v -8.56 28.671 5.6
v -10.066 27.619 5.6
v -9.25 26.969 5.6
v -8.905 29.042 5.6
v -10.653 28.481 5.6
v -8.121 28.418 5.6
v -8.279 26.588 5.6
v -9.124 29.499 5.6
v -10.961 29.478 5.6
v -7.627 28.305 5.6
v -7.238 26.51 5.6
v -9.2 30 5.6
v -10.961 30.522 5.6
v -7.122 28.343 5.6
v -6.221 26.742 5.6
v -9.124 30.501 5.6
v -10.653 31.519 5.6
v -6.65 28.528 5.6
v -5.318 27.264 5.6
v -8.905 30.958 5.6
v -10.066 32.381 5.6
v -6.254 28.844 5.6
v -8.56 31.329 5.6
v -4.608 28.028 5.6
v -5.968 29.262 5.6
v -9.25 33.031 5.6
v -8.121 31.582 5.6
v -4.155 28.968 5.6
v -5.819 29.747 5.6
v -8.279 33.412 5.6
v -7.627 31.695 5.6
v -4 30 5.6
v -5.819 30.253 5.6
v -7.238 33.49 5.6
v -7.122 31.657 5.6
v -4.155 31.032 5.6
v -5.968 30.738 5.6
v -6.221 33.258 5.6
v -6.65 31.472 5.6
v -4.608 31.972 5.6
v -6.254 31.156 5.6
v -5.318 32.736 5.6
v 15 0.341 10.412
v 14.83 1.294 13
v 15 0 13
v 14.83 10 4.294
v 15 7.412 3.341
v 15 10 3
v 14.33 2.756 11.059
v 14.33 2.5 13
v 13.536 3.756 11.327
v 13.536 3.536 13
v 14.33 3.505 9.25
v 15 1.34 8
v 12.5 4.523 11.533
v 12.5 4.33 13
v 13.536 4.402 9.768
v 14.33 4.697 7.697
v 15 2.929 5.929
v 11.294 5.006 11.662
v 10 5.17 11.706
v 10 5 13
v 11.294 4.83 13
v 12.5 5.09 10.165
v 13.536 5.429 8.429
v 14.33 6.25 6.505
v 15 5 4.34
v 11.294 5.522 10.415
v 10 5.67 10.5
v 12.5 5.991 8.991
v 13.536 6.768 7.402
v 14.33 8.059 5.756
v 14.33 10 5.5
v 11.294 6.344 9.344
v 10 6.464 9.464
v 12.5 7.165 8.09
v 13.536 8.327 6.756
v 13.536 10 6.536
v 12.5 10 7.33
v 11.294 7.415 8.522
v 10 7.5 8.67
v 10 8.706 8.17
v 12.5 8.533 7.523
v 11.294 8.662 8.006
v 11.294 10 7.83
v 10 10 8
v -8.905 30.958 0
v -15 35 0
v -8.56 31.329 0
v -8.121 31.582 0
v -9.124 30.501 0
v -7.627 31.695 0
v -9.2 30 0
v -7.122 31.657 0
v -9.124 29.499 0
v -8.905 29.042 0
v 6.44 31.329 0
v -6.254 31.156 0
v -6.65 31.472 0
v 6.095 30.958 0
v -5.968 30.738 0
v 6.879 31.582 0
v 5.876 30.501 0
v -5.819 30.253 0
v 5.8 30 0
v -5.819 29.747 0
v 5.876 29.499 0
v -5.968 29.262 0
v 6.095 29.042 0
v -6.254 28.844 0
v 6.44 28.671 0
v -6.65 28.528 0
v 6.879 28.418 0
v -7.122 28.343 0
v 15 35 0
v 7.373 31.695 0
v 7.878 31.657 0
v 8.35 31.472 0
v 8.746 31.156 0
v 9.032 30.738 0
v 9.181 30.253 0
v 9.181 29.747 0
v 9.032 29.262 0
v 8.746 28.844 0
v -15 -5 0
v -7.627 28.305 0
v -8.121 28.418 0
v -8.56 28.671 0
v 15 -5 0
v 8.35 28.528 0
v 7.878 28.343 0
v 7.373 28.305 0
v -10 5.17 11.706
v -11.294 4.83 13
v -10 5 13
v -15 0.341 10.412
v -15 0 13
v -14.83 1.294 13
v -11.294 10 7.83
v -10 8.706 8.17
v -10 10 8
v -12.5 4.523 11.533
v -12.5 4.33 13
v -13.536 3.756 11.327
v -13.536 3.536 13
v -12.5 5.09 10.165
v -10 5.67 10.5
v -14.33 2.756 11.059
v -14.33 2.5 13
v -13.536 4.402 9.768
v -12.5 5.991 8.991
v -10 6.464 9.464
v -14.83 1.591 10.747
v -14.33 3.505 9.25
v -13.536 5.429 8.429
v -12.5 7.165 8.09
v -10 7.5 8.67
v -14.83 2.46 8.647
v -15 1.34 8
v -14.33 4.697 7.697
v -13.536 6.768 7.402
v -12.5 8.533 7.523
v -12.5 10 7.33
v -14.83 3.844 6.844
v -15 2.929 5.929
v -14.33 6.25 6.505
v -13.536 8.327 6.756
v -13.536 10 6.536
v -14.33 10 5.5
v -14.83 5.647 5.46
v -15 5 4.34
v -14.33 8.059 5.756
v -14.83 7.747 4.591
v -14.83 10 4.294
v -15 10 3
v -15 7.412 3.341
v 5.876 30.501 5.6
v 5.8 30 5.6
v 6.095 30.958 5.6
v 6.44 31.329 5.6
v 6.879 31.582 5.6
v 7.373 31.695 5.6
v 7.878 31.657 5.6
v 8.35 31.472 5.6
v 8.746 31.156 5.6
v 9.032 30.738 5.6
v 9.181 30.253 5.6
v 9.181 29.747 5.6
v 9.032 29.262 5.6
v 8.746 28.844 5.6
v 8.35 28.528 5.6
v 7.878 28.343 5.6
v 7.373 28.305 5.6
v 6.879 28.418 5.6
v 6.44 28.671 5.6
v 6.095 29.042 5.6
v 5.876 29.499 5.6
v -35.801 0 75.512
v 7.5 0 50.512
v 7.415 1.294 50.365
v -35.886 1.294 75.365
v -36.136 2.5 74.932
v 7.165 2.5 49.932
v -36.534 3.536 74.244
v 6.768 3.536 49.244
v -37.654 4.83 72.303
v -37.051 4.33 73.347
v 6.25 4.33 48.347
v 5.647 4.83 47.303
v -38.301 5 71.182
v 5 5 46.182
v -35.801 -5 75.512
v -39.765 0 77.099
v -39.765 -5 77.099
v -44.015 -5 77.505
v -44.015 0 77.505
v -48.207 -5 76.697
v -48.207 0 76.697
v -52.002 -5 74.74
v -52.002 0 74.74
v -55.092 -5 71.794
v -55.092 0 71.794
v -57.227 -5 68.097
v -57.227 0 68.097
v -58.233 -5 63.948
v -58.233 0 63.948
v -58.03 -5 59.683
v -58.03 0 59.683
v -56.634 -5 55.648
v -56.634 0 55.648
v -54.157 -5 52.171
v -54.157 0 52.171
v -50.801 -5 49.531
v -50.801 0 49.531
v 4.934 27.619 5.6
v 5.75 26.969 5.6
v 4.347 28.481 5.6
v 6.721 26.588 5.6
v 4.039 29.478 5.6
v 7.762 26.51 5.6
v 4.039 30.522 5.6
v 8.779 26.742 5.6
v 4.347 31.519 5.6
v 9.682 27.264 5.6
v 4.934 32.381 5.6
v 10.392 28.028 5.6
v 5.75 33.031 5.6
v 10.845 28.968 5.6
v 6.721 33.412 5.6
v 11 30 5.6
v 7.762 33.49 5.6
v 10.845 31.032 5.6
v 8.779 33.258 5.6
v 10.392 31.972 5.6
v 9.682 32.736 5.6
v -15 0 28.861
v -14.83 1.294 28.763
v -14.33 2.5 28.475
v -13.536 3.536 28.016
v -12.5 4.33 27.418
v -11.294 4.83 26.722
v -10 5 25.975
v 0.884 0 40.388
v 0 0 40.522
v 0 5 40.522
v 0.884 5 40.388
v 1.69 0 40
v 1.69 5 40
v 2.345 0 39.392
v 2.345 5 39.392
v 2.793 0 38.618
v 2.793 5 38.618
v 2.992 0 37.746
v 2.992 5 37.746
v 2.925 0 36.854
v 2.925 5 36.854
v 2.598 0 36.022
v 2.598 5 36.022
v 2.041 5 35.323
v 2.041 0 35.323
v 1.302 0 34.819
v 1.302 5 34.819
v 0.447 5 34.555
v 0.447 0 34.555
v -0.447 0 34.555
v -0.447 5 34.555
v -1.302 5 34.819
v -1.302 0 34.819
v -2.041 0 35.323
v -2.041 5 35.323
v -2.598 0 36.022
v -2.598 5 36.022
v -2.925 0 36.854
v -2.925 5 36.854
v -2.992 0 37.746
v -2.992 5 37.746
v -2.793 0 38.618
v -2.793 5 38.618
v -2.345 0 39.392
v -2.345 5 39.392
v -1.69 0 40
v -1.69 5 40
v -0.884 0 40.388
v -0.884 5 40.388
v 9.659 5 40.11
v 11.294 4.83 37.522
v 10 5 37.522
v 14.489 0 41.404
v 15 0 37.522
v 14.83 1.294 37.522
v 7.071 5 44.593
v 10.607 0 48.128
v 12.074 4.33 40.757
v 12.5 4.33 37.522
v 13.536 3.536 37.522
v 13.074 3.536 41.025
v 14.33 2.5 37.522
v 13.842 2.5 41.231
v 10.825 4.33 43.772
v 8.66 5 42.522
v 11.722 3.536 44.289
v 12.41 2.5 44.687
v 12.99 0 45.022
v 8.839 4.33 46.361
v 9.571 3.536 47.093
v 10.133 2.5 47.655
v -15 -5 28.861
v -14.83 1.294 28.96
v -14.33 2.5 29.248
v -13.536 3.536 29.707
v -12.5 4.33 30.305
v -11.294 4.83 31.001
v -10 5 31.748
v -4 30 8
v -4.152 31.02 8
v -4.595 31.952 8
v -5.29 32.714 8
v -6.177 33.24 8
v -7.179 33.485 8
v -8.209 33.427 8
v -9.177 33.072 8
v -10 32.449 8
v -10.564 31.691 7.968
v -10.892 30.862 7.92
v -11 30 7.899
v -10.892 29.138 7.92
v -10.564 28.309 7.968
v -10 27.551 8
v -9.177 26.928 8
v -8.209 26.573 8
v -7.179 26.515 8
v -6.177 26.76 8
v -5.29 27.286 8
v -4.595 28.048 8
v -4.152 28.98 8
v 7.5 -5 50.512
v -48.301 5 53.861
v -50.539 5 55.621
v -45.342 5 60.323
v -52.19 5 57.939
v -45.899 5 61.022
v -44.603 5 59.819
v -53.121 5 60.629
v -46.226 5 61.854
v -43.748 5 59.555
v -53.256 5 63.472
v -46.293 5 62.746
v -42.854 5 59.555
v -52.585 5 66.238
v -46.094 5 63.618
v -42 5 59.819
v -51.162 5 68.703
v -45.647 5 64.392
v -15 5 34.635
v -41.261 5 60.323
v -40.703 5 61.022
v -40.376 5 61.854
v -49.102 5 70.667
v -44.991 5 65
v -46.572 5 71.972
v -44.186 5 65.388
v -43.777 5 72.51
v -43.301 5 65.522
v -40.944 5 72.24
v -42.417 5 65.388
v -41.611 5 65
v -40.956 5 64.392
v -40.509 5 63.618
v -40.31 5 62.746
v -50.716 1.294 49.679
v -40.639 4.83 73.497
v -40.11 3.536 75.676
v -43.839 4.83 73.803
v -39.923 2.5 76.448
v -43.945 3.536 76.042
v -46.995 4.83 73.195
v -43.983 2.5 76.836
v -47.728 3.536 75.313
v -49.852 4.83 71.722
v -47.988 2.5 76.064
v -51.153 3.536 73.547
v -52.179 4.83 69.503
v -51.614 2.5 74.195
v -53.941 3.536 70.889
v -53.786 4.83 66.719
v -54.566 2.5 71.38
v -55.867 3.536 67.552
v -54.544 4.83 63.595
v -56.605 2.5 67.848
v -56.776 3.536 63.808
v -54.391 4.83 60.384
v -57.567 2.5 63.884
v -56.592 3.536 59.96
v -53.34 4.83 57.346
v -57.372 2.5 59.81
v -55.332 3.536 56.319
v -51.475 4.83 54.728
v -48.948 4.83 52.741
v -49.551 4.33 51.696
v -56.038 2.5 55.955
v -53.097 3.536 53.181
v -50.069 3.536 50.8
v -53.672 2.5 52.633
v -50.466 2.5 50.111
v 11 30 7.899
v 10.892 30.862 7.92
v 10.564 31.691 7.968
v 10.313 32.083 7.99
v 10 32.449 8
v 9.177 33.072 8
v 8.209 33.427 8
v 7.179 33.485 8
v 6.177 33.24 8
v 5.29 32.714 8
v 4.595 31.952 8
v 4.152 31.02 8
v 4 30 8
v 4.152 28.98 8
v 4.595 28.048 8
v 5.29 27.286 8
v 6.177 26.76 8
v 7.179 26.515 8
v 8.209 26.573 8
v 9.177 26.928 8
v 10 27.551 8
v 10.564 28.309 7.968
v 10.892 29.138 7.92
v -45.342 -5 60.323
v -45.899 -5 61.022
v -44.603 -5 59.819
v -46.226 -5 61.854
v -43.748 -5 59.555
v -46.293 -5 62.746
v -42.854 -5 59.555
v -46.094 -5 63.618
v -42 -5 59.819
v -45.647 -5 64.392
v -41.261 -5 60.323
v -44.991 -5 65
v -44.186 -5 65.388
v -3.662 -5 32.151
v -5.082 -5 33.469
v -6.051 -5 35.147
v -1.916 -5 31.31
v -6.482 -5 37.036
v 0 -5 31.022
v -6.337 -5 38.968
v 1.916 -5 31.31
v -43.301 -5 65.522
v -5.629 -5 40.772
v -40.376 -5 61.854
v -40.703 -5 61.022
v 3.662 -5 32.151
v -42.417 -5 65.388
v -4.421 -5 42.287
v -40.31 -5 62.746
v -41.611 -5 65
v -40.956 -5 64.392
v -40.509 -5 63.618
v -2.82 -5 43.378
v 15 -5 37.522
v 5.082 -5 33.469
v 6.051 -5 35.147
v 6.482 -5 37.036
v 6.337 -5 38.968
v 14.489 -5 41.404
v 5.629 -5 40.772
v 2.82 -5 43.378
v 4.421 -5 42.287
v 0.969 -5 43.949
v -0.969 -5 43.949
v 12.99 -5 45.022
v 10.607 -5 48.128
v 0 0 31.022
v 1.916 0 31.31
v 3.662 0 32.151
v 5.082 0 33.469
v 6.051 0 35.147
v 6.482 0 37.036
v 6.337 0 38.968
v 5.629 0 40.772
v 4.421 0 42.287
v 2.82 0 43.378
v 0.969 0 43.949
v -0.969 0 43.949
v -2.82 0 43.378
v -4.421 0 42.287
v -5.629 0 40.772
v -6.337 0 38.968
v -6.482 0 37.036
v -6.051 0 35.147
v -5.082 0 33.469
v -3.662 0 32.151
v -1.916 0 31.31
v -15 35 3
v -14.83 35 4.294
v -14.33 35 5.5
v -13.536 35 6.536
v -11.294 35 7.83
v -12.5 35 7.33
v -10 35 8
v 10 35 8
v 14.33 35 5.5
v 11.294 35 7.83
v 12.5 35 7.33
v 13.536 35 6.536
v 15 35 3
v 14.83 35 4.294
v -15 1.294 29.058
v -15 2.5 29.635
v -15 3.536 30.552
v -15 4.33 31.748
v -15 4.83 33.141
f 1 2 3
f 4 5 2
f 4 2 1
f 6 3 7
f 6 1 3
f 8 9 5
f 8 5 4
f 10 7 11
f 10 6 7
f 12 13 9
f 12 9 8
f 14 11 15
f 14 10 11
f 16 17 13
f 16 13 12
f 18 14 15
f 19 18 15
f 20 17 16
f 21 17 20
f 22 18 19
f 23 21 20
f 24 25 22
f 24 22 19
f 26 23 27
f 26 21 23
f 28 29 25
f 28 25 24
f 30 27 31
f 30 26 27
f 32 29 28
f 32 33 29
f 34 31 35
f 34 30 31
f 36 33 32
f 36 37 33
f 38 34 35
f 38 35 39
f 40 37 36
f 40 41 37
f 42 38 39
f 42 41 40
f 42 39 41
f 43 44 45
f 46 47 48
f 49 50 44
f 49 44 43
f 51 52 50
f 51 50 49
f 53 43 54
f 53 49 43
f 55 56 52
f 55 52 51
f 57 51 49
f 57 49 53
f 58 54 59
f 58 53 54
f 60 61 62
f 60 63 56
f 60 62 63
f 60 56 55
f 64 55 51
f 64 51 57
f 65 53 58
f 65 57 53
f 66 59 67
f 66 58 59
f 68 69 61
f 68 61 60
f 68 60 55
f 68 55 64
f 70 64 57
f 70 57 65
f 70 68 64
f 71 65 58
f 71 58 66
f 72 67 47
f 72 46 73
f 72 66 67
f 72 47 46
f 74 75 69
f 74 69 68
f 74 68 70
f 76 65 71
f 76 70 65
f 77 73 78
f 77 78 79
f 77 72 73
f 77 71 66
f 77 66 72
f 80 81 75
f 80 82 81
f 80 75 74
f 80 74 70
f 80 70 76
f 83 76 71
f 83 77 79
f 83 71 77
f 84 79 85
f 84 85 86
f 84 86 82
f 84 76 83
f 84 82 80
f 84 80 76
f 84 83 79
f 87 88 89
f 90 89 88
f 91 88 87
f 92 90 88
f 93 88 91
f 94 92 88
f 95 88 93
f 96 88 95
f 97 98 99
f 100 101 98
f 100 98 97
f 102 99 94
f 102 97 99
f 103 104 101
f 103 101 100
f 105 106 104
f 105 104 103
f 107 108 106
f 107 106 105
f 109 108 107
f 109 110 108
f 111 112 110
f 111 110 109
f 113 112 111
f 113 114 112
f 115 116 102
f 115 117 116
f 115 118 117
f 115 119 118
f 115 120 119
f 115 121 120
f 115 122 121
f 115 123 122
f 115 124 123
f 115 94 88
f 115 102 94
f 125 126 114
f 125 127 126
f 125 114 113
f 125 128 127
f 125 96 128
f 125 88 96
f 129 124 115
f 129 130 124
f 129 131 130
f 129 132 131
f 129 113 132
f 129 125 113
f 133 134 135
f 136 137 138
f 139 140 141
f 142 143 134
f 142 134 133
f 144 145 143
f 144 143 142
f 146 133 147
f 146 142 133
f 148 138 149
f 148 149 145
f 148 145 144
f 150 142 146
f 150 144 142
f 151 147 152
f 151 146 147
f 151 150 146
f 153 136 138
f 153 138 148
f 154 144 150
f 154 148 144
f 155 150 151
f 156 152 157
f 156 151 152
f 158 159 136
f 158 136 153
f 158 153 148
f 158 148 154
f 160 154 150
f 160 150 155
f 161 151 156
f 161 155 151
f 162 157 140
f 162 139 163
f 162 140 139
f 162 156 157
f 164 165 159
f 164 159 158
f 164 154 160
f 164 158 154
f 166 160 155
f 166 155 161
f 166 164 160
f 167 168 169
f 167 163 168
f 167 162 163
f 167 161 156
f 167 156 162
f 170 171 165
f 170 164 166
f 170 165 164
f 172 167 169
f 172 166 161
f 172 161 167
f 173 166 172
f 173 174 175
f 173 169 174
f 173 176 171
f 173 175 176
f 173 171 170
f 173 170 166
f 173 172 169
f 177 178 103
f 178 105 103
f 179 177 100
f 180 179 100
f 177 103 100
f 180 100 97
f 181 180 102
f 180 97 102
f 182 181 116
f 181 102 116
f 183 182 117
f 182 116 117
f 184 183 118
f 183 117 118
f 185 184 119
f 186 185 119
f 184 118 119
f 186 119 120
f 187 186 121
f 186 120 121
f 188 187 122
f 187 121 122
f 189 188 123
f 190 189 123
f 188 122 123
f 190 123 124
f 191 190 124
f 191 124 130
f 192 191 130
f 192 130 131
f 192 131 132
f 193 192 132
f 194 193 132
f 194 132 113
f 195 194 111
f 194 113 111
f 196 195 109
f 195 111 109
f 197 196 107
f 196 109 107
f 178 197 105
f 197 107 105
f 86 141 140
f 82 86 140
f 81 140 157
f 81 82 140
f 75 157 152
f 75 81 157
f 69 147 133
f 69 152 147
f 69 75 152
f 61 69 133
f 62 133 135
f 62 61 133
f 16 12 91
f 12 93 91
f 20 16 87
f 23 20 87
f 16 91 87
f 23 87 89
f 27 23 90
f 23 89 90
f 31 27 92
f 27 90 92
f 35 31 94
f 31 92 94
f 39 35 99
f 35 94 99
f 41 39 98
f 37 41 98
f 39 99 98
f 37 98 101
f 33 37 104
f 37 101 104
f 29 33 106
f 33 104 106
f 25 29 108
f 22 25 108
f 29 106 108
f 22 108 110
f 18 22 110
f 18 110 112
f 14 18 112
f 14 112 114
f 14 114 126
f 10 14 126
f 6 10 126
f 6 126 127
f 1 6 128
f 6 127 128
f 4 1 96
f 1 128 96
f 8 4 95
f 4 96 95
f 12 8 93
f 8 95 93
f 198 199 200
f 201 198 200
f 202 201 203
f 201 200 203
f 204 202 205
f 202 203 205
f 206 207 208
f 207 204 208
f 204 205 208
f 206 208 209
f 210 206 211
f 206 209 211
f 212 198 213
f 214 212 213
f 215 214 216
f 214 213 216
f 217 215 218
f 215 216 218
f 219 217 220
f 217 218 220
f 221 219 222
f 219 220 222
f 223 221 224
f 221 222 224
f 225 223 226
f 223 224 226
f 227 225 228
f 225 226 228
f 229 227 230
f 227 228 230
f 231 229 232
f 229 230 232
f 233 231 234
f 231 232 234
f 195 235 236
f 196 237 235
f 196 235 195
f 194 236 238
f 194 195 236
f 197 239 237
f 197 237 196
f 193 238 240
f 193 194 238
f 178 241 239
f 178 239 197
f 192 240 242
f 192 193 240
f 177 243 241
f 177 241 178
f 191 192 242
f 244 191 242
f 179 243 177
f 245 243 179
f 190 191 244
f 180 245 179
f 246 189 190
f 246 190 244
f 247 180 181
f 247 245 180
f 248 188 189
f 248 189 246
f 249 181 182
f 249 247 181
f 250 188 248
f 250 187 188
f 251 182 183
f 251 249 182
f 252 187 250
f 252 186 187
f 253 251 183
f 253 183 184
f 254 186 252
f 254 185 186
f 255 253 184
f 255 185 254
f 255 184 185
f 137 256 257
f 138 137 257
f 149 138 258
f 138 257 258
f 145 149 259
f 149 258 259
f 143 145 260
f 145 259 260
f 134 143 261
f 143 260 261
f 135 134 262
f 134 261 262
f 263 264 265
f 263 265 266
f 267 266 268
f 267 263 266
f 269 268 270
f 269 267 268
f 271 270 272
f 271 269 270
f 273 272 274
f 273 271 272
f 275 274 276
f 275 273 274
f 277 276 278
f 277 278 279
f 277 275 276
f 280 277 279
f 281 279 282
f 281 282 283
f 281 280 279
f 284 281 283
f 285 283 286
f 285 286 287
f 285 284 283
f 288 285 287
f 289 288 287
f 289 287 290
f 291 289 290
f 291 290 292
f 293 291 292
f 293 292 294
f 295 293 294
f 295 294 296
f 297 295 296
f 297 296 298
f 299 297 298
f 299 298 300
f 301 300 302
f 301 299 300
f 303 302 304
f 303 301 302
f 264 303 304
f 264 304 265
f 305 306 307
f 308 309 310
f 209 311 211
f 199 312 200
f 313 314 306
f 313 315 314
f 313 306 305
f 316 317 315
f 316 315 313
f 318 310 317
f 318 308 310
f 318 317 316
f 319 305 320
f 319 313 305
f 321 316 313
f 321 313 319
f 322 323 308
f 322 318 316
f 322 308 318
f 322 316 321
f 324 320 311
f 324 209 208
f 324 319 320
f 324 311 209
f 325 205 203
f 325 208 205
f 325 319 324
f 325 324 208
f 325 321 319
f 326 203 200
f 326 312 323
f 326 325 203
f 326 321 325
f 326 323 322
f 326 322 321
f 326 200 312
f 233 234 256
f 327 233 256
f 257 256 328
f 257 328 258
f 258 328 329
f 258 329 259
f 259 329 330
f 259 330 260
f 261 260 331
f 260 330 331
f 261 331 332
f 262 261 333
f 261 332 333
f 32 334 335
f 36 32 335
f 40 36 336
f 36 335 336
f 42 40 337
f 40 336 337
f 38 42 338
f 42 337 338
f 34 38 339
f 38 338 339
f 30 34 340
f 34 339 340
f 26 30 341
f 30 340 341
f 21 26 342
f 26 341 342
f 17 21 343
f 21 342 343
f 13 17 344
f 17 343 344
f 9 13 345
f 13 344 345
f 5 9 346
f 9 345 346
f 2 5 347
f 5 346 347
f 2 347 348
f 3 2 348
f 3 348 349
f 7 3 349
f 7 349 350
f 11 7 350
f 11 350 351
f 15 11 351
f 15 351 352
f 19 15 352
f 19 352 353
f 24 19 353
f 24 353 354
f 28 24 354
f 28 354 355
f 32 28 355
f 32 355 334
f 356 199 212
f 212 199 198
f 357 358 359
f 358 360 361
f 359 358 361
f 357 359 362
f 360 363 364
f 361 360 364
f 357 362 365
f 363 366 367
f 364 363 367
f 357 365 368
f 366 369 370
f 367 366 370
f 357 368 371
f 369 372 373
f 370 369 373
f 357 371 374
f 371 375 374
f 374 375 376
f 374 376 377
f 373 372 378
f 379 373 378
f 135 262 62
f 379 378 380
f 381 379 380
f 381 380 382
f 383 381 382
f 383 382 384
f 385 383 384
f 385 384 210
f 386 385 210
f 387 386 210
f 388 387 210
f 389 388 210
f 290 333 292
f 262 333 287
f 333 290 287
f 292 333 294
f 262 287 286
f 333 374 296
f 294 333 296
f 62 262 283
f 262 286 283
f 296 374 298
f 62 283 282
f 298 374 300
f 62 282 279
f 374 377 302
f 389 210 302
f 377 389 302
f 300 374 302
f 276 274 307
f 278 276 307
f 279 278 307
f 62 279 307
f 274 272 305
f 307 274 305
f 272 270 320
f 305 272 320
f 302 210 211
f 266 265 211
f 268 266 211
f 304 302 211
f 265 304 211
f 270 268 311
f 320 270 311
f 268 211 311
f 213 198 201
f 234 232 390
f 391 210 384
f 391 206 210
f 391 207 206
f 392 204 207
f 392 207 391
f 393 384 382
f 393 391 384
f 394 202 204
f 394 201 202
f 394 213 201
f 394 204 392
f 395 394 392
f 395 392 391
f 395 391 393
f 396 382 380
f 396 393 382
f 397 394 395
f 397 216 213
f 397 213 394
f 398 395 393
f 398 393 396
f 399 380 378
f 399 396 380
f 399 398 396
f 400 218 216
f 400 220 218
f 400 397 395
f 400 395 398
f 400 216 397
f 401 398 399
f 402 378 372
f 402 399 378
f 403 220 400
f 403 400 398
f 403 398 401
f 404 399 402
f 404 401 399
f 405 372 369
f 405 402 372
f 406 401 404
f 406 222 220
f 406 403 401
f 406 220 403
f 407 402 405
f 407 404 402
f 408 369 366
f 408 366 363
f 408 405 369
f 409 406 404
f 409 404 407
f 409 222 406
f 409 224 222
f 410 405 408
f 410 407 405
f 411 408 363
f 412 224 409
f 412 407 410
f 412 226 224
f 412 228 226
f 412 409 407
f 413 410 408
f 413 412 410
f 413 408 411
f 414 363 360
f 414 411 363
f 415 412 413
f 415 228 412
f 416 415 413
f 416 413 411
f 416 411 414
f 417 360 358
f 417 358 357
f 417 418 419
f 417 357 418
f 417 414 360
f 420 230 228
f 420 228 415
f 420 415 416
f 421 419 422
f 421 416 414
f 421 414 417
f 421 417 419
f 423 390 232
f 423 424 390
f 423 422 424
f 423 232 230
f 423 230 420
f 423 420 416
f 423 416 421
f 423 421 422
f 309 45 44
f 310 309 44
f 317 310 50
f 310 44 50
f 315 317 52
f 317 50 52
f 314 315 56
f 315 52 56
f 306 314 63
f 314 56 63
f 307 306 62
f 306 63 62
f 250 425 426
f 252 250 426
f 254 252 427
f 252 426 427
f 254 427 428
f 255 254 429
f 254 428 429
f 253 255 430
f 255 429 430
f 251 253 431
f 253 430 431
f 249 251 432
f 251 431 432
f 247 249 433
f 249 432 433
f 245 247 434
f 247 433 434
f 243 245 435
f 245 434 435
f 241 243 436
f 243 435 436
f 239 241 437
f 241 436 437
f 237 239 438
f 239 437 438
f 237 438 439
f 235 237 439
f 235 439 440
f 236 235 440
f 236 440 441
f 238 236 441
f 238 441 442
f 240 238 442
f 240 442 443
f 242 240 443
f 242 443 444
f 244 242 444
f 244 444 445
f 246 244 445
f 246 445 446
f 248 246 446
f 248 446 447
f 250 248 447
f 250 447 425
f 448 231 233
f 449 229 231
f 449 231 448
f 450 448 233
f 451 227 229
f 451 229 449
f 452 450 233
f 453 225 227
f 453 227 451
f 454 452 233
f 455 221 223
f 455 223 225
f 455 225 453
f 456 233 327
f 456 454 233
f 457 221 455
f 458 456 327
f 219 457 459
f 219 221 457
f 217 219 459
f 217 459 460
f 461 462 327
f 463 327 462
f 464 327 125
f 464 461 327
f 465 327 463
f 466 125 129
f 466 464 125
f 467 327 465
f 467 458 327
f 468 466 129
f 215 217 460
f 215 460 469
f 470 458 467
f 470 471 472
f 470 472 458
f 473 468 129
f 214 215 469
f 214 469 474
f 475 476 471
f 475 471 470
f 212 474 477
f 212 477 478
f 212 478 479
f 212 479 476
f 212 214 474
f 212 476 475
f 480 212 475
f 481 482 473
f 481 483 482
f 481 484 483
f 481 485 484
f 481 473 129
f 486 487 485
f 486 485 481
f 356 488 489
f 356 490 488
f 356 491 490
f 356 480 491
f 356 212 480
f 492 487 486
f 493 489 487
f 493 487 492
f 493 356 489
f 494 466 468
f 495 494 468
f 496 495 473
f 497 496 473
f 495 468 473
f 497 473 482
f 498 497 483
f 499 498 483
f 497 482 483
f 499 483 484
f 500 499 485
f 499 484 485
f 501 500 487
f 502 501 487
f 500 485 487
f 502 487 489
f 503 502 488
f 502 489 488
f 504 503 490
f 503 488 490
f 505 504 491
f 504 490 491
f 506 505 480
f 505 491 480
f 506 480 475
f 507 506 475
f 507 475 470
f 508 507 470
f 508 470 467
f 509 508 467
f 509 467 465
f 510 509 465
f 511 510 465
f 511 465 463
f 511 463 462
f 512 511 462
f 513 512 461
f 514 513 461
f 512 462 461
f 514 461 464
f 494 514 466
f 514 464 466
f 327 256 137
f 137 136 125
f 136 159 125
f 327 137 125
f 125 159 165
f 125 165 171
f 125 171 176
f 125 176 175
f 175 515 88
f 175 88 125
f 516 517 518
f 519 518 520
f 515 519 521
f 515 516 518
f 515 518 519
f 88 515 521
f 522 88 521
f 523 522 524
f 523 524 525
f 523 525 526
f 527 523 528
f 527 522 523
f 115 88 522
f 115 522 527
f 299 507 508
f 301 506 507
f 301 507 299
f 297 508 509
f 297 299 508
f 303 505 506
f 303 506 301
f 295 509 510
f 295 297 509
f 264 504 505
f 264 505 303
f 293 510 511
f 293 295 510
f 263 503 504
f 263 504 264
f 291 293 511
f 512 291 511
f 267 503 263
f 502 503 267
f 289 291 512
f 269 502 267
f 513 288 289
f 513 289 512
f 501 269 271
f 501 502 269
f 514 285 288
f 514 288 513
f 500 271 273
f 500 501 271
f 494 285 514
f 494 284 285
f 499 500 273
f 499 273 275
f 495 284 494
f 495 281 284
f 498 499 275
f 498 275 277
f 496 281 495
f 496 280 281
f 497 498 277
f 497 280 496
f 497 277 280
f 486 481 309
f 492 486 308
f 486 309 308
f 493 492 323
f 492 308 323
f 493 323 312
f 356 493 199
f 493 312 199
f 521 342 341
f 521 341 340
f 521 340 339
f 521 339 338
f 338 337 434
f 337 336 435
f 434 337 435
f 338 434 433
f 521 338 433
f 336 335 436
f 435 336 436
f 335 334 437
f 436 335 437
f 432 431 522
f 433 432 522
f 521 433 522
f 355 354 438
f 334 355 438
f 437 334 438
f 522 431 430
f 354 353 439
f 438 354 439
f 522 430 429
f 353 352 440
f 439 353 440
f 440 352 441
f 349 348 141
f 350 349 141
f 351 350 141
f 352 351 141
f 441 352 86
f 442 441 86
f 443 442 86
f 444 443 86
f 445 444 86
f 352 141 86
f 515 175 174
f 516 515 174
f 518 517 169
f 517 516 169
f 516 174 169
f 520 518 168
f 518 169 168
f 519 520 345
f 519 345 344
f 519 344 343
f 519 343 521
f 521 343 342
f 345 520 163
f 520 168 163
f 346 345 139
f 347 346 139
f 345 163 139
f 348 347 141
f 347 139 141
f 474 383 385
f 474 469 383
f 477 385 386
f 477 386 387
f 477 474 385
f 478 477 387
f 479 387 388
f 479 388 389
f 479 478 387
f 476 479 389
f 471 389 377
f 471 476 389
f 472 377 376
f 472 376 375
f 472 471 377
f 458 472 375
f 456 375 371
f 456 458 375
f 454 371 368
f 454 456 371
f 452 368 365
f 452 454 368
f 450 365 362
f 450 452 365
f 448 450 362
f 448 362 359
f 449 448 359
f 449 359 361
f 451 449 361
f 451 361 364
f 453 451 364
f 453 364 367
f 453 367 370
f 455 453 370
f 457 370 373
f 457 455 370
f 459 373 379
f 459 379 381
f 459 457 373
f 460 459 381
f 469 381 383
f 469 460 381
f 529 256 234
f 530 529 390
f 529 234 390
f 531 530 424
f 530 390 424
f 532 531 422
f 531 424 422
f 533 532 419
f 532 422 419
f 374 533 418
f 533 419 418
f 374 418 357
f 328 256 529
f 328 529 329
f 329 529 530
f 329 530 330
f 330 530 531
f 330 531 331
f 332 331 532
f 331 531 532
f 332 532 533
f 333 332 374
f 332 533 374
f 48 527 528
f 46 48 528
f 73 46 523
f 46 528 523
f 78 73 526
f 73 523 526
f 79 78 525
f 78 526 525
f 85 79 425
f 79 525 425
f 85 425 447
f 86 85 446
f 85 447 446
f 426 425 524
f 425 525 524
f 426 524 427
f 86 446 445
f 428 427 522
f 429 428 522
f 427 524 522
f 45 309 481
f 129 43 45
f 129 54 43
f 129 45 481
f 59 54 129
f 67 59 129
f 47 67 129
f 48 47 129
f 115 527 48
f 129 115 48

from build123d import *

# Parameters (mm, degrees)
CROQUIS1_R                                           = 3
SALIENTE_EXTRUIR1_DEPTH                              = 5
CROQUIS2_W                                           = 30
CROQUIS2_H                                           = 30
SALIENTE_EXTRUIR2_DEPTH                              = 8
REFRENTADO_PARA_TORNILLO_CON_CABEZA_TRON_D           = 3.4
REFRENTADO_PARA_TORNILLO_CON_CABEZA_TRON_CBORE_D     = 7
REFRENTADO_PARA_TORNILLO_CON_CABEZA_TRON_CBORE_DEPTH = 2.4
CROQUIS11_R                                          = 6.5
CORTAR_EXTRUIR3_DEPTH                                = 5
REDONDEO8_R                                          = 5


with BuildPart() as part:
    # Croquis1 → Saliente-Extruir1 (new, symmetric)
    with BuildSketch(Plane(origin=(0, 0, 0), x_dir=(-1, 0, 0), z_dir=(0, 1, 0))):
        with BuildLine():
            Line((15, 0), (-15, 0))
            Line((-15, 0), (-15, 37.5217))
            ThreePointArc((-15, 37.5217), (-12.990381057, 45.0217), (-7.5, 50.512081057))
            Line((-7.5, 50.512081057), (35.801270189, 75.512081057))
            ThreePointArc((35.801270189, 75.512081057), (56.291651246, 70.0217), (50.801270189, 49.531318943))
            Line((50.801270189, 49.531318943), (15, 28.861445962))
            Line((15, 28.861445962), (15, 0))
        make_face()
        with Locations(Location((0, 37.5217, 0), (0, 0, 90))):
            Circle(CROQUIS1_R, mode=Mode.SUBTRACT)
        with Locations(Location((43.301270189, 62.5217, 0), (0, 0, 90))):
            Circle(CROQUIS1_R, mode=Mode.SUBTRACT)
    extrude(amount=SALIENTE_EXTRUIR1_DEPTH, both=True)

    # Croquis2 → Saliente-Extruir2 (add)
    with BuildSketch(Plane(origin=(0, 0, 0), x_dir=(1, 0, 0), z_dir=(0, 0, -1))):
        with Locations((0, -20)):
            Rectangle(CROQUIS2_W, CROQUIS2_H)
    extrude(amount=-SALIENTE_EXTRUIR2_DEPTH)

    # Refrentado para tornillo con cabeza troncocónica de M31 (through all)
    with Locations(Plane.XY.offset(8)):
        with Locations((-7.5, 30), (7.5, 30)):
            CounterBoreHole(REFRENTADO_PARA_TORNILLO_CON_CABEZA_TRON_D / 2, REFRENTADO_PARA_TORNILLO_CON_CABEZA_TRON_CBORE_D / 2, REFRENTADO_PARA_TORNILLO_CON_CABEZA_TRON_CBORE_DEPTH)

    # Croquis11 → Cortar-Extruir3 (cut)
    with BuildSketch(Plane.XZ.offset(5)):
        with Locations(Location((0, 37.5217, 0), (0, 0, 270))):
            Circle(CROQUIS11_R)
    extrude(amount=-CORTAR_EXTRUIR3_DEPTH, mode=Mode.SUBTRACT)

    # Redondeo8
    # the kernel refuses this fillet: 5 mm, written as the material it adds along each edge
    with BuildSketch(Plane(origin=(15, 5, 8), x_dir=(0, 0, 1), z_dir=(-1, 0, 0))) as redondeo8_piece_1:
        with BuildLine():
            CenterArc((REDONDEO8_R, REDONDEO8_R), REDONDEO8_R, 180, 90)
            Line((0, REDONDEO8_R), (0, 0))
            Line((0, 0), (REDONDEO8_R, 0))
        make_face()
    extrude(amount=30)
    # the kernel refuses this fillet: 5 mm, written as the material it takes off along each edge
    with BuildSketch(Plane(origin=(-50.801270189, 5, 49.531318943), x_dir=(0.4999999999999951, 0, 0.8660254037844415), z_dir=(0.8660254037844415, 0, -0.49999999999999517))) as redondeo8_2_piece_1_section:
        with BuildLine():
            CenterArc((REDONDEO8_R, REDONDEO8_R), REDONDEO8_R, 180, 90)
            Line((0, REDONDEO8_R), (0, 0))
            Line((0, 0), (REDONDEO8_R, 0))
        make_face()
    redondeo8_2_piece_1 = extrude(amount=53.839745962, mode=Mode.PRIVATE)
    redondeo8_2_piece_1 = split(redondeo8_2_piece_1, bisect_by=Plane(origin=(-15, 3.85828394, 40.323429829), z_dir=(-1, 0, 0)), keep=Keep.TOP, mode=Mode.PRIVATE)
    add(redondeo8_2_piece_1, mode=Mode.SUBTRACT)
    with BuildSketch(Plane(origin=(-43.301270189, 5, 62.5217), x_dir=(0.4999999999999953, 0, 0.8660254037844414), z_dir=(0.8660254037844414, 0, -0.4999999999999953))) as redondeo8_2_piece_2:
        with BuildLine():
            CenterArc((15 - REDONDEO8_R, REDONDEO8_R), REDONDEO8_R, 270, 90)
            Line((15, REDONDEO8_R), (15, 0))
            Line((15, 0), (15 - REDONDEO8_R, 0))
        make_face()
    revolve(axis=Axis((-43.301270189, 5, 62.5217), (0, -1, 0)), revolution_arc=180, mode=Mode.SUBTRACT)
    with BuildSketch(Plane(origin=(7.5, 5, 50.512081057), x_dir=(0, -1, 0), z_dir=(-0.8660254037844416, 0, 0.499999999999995))) as redondeo8_2_piece_3:
        with BuildLine():
            CenterArc((REDONDEO8_R, -REDONDEO8_R), REDONDEO8_R, 90, 90)
            Line((0, -REDONDEO8_R), (0, 0))
            Line((0, 0), (REDONDEO8_R, 0))
        make_face()
    extrude(amount=50, mode=Mode.SUBTRACT)
    with BuildSketch(Plane(origin=(0, 5, 37.5217), x_dir=(1, 0, 0), z_dir=(0, 0, -1))) as redondeo8_2_piece_4:
        with BuildLine():
            CenterArc((15 - REDONDEO8_R, REDONDEO8_R), REDONDEO8_R, 270, 90)
            Line((15 - REDONDEO8_R, 0), (15, 0))
            Line((15, 0), (15, REDONDEO8_R))
        make_face()
    revolve(axis=Axis((0, 5, 37.5217), (0, -1, 0)), revolution_arc=60, mode=Mode.SUBTRACT)
    with BuildSketch(Plane(origin=(-15, 5, 41.361445962), x_dir=(1, 0, 0), z_dir=(0, 0, -1))) as redondeo8_2_piece_5_section:
        with BuildLine():
            CenterArc((REDONDEO8_R, REDONDEO8_R), REDONDEO8_R, 180, 90)
            Line((0, REDONDEO8_R), (0, 0))
            Line((0, 0), (REDONDEO8_R, 0))
        make_face()
    redondeo8_2_piece_5 = extrude(amount=28.361445962, mode=Mode.PRIVATE)
    redondeo8_2_piece_5 = split(redondeo8_2_piece_5, bisect_by=Plane(origin=(-10.61401453, 3.841965375, 26.329196071), z_dir=(-0.49999999999999517, 0, -0.8660254037844415)), keep=Keep.TOP, mode=Mode.PRIVATE)
    add(redondeo8_2_piece_5, mode=Mode.SUBTRACT)
    with BuildSketch(Plane(origin=(15, 47.5, 8), x_dir=(0, 0, -1), z_dir=(0, -1, 0))) as redondeo8_2_piece_6:
        with BuildLine():
            CenterArc((REDONDEO8_R, -REDONDEO8_R), REDONDEO8_R, 90, 90)
            Line((0, -REDONDEO8_R), (0, 0))
            Line((0, 0), (REDONDEO8_R, 0))
        make_face()
    extrude(amount=37.5, mode=Mode.SUBTRACT)
    with BuildSketch(Plane(origin=(-15, 10, 8), x_dir=(1, 0, 0), z_dir=(0, 1, 0))) as redondeo8_2_piece_7:
        with BuildLine():
            CenterArc((REDONDEO8_R, REDONDEO8_R), REDONDEO8_R, 180, 90)
            Line((0, REDONDEO8_R), (0, 0))
            Line((0, 0), (REDONDEO8_R, 0))
        make_face()
    extrude(amount=37.5, mode=Mode.SUBTRACT)
    with BuildSketch(Plane(origin=(15, 5, 13), x_dir=(0, -1, 0), z_dir=(0, 0, 1))) as redondeo8_2_piece_8:
        with BuildLine():
            CenterArc((REDONDEO8_R, -REDONDEO8_R), REDONDEO8_R, 90, 90)
            Line((0, -REDONDEO8_R), (0, 0))
            Line((0, 0), (REDONDEO8_R, 0))
        make_face()
    extrude(amount=24.5217, mode=Mode.SUBTRACT)
    with BuildSketch(Plane(origin=(15, 10, 13), x_dir=(0, -1, 0), z_dir=(0, 0, 1))) as redondeo8_2_piece_9:
        with BuildLine():
            CenterArc((5 + REDONDEO8_R, -REDONDEO8_R), REDONDEO8_R, 90, 90)
            Line((5, -REDONDEO8_R), (5, 0))
            Line((5, 0), (5 + REDONDEO8_R, 0))
        make_face()
    revolve(axis=Axis((15, 10, 13), (1, 0, 0)), revolution_arc=90, mode=Mode.SUBTRACT)
    with BuildSketch(Plane(origin=(-15, 10, 13), x_dir=(0, -1, 0), z_dir=(0, 0, 1))) as redondeo8_2_piece_10:
        with BuildLine():
            CenterArc((5 + REDONDEO8_R, REDONDEO8_R), REDONDEO8_R, 180, 90)
            Line((5, REDONDEO8_R), (5, 0))
            Line((5, 0), (5 + REDONDEO8_R, 0))
        make_face()
    revolve(axis=Axis((-15, 10, 13), (1, 0, 0)), revolution_arc=90, mode=Mode.SUBTRACT)
    with BuildSketch(Plane(origin=(-15, 5, 41.361445962), x_dir=(1, 0, 0), z_dir=(0, 0, -1))) as redondeo8_2_piece_11a_section:
        with BuildLine():
            CenterArc((REDONDEO8_R, REDONDEO8_R), REDONDEO8_R, 180, 90)
            Line((0, REDONDEO8_R), (0, 0))
            Line((0, 0), (REDONDEO8_R, 0))
        make_face()
    redondeo8_2_piece_11a = extrude(amount=28.361445962, mode=Mode.PRIVATE)
    redondeo8_2_piece_11a = split(redondeo8_2_piece_11a, bisect_by=Plane(origin=(-16.671225656, 3.89815345, 29.826328544), z_dir=(0.49999999999999517, 0, 0.8660254037844415)), keep=Keep.TOP, mode=Mode.PRIVATE)
    with BuildSketch(Plane(origin=(-50.801270189, 5, 49.531318943), x_dir=(0.4999999999999951, 0, 0.8660254037844415), z_dir=(0.8660254037844415, 0, -0.49999999999999517))) as redondeo8_2_piece_11b_section:
        with BuildLine():
            CenterArc((REDONDEO8_R, REDONDEO8_R), REDONDEO8_R, 180, 90)
            Line((0, REDONDEO8_R), (0, 0))
            Line((0, 0), (REDONDEO8_R, 0))
        make_face()
    redondeo8_2_piece_11b = extrude(amount=53.839745962, mode=Mode.PRIVATE)
    redondeo8_2_piece_11b = split(redondeo8_2_piece_11b, bisect_by=Plane(origin=(-15, 3.89815345, 26.931680798), z_dir=(1, 0, 0)), keep=Keep.TOP, mode=Mode.PRIVATE)
    redondeo8_2_piece_11 = redondeo8_2_piece_11a & redondeo8_2_piece_11b
    add(redondeo8_2_piece_11, mode=Mode.SUBTRACT)


solid = part.part
